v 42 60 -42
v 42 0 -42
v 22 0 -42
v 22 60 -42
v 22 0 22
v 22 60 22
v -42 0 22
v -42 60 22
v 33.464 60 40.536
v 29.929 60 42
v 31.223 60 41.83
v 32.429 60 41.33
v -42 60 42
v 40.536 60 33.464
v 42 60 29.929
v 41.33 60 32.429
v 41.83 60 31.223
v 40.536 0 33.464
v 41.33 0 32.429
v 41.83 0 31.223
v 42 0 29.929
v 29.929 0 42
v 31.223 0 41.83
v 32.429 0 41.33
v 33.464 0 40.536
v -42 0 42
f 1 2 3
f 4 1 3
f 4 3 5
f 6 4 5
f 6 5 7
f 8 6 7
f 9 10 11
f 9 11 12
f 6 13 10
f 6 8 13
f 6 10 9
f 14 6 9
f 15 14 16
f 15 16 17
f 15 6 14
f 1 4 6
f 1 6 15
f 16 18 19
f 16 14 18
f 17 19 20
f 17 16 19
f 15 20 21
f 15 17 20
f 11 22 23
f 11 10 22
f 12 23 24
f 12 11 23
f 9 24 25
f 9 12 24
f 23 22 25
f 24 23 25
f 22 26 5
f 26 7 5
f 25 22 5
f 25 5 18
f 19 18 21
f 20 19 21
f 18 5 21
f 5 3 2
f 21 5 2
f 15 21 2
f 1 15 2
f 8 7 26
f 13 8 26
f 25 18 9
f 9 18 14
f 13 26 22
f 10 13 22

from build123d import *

# Parameters (mm, degrees)
BOSS_EXTRUDE1_DEPTH = 60
CHAMFER1_SIZE       = 10
FILLET1_R           = 5


with BuildPart() as part:
    # Sketch1 → Boss-Extrude1 (new body)
    with BuildSketch(Plane(origin=(0, 0, 0), x_dir=(1, 0, 0), z_dir=(0, 1, 0))):
        Polygon((22, 42), (22, -22), (-42, -22), (-42, -42), (42, -42), (42, 42), align=None)
    extrude(amount=BOSS_EXTRUDE1_DEPTH)

    # Chamfer1
    chamfer1_edges = [part.edges().sort_by_distance(p)[0] for p in [
        (42, 30, 42),
    ]]
    chamfer(chamfer1_edges, length=CHAMFER1_SIZE)

    # Fillet1
    fillet1_edges = [part.edges().sort_by_distance(p)[0] for p in [
        (42, 30, 32),
        (32, 30, 42),
    ]]
    fillet(fillet1_edges, radius=FILLET1_R)


solid = part.part
